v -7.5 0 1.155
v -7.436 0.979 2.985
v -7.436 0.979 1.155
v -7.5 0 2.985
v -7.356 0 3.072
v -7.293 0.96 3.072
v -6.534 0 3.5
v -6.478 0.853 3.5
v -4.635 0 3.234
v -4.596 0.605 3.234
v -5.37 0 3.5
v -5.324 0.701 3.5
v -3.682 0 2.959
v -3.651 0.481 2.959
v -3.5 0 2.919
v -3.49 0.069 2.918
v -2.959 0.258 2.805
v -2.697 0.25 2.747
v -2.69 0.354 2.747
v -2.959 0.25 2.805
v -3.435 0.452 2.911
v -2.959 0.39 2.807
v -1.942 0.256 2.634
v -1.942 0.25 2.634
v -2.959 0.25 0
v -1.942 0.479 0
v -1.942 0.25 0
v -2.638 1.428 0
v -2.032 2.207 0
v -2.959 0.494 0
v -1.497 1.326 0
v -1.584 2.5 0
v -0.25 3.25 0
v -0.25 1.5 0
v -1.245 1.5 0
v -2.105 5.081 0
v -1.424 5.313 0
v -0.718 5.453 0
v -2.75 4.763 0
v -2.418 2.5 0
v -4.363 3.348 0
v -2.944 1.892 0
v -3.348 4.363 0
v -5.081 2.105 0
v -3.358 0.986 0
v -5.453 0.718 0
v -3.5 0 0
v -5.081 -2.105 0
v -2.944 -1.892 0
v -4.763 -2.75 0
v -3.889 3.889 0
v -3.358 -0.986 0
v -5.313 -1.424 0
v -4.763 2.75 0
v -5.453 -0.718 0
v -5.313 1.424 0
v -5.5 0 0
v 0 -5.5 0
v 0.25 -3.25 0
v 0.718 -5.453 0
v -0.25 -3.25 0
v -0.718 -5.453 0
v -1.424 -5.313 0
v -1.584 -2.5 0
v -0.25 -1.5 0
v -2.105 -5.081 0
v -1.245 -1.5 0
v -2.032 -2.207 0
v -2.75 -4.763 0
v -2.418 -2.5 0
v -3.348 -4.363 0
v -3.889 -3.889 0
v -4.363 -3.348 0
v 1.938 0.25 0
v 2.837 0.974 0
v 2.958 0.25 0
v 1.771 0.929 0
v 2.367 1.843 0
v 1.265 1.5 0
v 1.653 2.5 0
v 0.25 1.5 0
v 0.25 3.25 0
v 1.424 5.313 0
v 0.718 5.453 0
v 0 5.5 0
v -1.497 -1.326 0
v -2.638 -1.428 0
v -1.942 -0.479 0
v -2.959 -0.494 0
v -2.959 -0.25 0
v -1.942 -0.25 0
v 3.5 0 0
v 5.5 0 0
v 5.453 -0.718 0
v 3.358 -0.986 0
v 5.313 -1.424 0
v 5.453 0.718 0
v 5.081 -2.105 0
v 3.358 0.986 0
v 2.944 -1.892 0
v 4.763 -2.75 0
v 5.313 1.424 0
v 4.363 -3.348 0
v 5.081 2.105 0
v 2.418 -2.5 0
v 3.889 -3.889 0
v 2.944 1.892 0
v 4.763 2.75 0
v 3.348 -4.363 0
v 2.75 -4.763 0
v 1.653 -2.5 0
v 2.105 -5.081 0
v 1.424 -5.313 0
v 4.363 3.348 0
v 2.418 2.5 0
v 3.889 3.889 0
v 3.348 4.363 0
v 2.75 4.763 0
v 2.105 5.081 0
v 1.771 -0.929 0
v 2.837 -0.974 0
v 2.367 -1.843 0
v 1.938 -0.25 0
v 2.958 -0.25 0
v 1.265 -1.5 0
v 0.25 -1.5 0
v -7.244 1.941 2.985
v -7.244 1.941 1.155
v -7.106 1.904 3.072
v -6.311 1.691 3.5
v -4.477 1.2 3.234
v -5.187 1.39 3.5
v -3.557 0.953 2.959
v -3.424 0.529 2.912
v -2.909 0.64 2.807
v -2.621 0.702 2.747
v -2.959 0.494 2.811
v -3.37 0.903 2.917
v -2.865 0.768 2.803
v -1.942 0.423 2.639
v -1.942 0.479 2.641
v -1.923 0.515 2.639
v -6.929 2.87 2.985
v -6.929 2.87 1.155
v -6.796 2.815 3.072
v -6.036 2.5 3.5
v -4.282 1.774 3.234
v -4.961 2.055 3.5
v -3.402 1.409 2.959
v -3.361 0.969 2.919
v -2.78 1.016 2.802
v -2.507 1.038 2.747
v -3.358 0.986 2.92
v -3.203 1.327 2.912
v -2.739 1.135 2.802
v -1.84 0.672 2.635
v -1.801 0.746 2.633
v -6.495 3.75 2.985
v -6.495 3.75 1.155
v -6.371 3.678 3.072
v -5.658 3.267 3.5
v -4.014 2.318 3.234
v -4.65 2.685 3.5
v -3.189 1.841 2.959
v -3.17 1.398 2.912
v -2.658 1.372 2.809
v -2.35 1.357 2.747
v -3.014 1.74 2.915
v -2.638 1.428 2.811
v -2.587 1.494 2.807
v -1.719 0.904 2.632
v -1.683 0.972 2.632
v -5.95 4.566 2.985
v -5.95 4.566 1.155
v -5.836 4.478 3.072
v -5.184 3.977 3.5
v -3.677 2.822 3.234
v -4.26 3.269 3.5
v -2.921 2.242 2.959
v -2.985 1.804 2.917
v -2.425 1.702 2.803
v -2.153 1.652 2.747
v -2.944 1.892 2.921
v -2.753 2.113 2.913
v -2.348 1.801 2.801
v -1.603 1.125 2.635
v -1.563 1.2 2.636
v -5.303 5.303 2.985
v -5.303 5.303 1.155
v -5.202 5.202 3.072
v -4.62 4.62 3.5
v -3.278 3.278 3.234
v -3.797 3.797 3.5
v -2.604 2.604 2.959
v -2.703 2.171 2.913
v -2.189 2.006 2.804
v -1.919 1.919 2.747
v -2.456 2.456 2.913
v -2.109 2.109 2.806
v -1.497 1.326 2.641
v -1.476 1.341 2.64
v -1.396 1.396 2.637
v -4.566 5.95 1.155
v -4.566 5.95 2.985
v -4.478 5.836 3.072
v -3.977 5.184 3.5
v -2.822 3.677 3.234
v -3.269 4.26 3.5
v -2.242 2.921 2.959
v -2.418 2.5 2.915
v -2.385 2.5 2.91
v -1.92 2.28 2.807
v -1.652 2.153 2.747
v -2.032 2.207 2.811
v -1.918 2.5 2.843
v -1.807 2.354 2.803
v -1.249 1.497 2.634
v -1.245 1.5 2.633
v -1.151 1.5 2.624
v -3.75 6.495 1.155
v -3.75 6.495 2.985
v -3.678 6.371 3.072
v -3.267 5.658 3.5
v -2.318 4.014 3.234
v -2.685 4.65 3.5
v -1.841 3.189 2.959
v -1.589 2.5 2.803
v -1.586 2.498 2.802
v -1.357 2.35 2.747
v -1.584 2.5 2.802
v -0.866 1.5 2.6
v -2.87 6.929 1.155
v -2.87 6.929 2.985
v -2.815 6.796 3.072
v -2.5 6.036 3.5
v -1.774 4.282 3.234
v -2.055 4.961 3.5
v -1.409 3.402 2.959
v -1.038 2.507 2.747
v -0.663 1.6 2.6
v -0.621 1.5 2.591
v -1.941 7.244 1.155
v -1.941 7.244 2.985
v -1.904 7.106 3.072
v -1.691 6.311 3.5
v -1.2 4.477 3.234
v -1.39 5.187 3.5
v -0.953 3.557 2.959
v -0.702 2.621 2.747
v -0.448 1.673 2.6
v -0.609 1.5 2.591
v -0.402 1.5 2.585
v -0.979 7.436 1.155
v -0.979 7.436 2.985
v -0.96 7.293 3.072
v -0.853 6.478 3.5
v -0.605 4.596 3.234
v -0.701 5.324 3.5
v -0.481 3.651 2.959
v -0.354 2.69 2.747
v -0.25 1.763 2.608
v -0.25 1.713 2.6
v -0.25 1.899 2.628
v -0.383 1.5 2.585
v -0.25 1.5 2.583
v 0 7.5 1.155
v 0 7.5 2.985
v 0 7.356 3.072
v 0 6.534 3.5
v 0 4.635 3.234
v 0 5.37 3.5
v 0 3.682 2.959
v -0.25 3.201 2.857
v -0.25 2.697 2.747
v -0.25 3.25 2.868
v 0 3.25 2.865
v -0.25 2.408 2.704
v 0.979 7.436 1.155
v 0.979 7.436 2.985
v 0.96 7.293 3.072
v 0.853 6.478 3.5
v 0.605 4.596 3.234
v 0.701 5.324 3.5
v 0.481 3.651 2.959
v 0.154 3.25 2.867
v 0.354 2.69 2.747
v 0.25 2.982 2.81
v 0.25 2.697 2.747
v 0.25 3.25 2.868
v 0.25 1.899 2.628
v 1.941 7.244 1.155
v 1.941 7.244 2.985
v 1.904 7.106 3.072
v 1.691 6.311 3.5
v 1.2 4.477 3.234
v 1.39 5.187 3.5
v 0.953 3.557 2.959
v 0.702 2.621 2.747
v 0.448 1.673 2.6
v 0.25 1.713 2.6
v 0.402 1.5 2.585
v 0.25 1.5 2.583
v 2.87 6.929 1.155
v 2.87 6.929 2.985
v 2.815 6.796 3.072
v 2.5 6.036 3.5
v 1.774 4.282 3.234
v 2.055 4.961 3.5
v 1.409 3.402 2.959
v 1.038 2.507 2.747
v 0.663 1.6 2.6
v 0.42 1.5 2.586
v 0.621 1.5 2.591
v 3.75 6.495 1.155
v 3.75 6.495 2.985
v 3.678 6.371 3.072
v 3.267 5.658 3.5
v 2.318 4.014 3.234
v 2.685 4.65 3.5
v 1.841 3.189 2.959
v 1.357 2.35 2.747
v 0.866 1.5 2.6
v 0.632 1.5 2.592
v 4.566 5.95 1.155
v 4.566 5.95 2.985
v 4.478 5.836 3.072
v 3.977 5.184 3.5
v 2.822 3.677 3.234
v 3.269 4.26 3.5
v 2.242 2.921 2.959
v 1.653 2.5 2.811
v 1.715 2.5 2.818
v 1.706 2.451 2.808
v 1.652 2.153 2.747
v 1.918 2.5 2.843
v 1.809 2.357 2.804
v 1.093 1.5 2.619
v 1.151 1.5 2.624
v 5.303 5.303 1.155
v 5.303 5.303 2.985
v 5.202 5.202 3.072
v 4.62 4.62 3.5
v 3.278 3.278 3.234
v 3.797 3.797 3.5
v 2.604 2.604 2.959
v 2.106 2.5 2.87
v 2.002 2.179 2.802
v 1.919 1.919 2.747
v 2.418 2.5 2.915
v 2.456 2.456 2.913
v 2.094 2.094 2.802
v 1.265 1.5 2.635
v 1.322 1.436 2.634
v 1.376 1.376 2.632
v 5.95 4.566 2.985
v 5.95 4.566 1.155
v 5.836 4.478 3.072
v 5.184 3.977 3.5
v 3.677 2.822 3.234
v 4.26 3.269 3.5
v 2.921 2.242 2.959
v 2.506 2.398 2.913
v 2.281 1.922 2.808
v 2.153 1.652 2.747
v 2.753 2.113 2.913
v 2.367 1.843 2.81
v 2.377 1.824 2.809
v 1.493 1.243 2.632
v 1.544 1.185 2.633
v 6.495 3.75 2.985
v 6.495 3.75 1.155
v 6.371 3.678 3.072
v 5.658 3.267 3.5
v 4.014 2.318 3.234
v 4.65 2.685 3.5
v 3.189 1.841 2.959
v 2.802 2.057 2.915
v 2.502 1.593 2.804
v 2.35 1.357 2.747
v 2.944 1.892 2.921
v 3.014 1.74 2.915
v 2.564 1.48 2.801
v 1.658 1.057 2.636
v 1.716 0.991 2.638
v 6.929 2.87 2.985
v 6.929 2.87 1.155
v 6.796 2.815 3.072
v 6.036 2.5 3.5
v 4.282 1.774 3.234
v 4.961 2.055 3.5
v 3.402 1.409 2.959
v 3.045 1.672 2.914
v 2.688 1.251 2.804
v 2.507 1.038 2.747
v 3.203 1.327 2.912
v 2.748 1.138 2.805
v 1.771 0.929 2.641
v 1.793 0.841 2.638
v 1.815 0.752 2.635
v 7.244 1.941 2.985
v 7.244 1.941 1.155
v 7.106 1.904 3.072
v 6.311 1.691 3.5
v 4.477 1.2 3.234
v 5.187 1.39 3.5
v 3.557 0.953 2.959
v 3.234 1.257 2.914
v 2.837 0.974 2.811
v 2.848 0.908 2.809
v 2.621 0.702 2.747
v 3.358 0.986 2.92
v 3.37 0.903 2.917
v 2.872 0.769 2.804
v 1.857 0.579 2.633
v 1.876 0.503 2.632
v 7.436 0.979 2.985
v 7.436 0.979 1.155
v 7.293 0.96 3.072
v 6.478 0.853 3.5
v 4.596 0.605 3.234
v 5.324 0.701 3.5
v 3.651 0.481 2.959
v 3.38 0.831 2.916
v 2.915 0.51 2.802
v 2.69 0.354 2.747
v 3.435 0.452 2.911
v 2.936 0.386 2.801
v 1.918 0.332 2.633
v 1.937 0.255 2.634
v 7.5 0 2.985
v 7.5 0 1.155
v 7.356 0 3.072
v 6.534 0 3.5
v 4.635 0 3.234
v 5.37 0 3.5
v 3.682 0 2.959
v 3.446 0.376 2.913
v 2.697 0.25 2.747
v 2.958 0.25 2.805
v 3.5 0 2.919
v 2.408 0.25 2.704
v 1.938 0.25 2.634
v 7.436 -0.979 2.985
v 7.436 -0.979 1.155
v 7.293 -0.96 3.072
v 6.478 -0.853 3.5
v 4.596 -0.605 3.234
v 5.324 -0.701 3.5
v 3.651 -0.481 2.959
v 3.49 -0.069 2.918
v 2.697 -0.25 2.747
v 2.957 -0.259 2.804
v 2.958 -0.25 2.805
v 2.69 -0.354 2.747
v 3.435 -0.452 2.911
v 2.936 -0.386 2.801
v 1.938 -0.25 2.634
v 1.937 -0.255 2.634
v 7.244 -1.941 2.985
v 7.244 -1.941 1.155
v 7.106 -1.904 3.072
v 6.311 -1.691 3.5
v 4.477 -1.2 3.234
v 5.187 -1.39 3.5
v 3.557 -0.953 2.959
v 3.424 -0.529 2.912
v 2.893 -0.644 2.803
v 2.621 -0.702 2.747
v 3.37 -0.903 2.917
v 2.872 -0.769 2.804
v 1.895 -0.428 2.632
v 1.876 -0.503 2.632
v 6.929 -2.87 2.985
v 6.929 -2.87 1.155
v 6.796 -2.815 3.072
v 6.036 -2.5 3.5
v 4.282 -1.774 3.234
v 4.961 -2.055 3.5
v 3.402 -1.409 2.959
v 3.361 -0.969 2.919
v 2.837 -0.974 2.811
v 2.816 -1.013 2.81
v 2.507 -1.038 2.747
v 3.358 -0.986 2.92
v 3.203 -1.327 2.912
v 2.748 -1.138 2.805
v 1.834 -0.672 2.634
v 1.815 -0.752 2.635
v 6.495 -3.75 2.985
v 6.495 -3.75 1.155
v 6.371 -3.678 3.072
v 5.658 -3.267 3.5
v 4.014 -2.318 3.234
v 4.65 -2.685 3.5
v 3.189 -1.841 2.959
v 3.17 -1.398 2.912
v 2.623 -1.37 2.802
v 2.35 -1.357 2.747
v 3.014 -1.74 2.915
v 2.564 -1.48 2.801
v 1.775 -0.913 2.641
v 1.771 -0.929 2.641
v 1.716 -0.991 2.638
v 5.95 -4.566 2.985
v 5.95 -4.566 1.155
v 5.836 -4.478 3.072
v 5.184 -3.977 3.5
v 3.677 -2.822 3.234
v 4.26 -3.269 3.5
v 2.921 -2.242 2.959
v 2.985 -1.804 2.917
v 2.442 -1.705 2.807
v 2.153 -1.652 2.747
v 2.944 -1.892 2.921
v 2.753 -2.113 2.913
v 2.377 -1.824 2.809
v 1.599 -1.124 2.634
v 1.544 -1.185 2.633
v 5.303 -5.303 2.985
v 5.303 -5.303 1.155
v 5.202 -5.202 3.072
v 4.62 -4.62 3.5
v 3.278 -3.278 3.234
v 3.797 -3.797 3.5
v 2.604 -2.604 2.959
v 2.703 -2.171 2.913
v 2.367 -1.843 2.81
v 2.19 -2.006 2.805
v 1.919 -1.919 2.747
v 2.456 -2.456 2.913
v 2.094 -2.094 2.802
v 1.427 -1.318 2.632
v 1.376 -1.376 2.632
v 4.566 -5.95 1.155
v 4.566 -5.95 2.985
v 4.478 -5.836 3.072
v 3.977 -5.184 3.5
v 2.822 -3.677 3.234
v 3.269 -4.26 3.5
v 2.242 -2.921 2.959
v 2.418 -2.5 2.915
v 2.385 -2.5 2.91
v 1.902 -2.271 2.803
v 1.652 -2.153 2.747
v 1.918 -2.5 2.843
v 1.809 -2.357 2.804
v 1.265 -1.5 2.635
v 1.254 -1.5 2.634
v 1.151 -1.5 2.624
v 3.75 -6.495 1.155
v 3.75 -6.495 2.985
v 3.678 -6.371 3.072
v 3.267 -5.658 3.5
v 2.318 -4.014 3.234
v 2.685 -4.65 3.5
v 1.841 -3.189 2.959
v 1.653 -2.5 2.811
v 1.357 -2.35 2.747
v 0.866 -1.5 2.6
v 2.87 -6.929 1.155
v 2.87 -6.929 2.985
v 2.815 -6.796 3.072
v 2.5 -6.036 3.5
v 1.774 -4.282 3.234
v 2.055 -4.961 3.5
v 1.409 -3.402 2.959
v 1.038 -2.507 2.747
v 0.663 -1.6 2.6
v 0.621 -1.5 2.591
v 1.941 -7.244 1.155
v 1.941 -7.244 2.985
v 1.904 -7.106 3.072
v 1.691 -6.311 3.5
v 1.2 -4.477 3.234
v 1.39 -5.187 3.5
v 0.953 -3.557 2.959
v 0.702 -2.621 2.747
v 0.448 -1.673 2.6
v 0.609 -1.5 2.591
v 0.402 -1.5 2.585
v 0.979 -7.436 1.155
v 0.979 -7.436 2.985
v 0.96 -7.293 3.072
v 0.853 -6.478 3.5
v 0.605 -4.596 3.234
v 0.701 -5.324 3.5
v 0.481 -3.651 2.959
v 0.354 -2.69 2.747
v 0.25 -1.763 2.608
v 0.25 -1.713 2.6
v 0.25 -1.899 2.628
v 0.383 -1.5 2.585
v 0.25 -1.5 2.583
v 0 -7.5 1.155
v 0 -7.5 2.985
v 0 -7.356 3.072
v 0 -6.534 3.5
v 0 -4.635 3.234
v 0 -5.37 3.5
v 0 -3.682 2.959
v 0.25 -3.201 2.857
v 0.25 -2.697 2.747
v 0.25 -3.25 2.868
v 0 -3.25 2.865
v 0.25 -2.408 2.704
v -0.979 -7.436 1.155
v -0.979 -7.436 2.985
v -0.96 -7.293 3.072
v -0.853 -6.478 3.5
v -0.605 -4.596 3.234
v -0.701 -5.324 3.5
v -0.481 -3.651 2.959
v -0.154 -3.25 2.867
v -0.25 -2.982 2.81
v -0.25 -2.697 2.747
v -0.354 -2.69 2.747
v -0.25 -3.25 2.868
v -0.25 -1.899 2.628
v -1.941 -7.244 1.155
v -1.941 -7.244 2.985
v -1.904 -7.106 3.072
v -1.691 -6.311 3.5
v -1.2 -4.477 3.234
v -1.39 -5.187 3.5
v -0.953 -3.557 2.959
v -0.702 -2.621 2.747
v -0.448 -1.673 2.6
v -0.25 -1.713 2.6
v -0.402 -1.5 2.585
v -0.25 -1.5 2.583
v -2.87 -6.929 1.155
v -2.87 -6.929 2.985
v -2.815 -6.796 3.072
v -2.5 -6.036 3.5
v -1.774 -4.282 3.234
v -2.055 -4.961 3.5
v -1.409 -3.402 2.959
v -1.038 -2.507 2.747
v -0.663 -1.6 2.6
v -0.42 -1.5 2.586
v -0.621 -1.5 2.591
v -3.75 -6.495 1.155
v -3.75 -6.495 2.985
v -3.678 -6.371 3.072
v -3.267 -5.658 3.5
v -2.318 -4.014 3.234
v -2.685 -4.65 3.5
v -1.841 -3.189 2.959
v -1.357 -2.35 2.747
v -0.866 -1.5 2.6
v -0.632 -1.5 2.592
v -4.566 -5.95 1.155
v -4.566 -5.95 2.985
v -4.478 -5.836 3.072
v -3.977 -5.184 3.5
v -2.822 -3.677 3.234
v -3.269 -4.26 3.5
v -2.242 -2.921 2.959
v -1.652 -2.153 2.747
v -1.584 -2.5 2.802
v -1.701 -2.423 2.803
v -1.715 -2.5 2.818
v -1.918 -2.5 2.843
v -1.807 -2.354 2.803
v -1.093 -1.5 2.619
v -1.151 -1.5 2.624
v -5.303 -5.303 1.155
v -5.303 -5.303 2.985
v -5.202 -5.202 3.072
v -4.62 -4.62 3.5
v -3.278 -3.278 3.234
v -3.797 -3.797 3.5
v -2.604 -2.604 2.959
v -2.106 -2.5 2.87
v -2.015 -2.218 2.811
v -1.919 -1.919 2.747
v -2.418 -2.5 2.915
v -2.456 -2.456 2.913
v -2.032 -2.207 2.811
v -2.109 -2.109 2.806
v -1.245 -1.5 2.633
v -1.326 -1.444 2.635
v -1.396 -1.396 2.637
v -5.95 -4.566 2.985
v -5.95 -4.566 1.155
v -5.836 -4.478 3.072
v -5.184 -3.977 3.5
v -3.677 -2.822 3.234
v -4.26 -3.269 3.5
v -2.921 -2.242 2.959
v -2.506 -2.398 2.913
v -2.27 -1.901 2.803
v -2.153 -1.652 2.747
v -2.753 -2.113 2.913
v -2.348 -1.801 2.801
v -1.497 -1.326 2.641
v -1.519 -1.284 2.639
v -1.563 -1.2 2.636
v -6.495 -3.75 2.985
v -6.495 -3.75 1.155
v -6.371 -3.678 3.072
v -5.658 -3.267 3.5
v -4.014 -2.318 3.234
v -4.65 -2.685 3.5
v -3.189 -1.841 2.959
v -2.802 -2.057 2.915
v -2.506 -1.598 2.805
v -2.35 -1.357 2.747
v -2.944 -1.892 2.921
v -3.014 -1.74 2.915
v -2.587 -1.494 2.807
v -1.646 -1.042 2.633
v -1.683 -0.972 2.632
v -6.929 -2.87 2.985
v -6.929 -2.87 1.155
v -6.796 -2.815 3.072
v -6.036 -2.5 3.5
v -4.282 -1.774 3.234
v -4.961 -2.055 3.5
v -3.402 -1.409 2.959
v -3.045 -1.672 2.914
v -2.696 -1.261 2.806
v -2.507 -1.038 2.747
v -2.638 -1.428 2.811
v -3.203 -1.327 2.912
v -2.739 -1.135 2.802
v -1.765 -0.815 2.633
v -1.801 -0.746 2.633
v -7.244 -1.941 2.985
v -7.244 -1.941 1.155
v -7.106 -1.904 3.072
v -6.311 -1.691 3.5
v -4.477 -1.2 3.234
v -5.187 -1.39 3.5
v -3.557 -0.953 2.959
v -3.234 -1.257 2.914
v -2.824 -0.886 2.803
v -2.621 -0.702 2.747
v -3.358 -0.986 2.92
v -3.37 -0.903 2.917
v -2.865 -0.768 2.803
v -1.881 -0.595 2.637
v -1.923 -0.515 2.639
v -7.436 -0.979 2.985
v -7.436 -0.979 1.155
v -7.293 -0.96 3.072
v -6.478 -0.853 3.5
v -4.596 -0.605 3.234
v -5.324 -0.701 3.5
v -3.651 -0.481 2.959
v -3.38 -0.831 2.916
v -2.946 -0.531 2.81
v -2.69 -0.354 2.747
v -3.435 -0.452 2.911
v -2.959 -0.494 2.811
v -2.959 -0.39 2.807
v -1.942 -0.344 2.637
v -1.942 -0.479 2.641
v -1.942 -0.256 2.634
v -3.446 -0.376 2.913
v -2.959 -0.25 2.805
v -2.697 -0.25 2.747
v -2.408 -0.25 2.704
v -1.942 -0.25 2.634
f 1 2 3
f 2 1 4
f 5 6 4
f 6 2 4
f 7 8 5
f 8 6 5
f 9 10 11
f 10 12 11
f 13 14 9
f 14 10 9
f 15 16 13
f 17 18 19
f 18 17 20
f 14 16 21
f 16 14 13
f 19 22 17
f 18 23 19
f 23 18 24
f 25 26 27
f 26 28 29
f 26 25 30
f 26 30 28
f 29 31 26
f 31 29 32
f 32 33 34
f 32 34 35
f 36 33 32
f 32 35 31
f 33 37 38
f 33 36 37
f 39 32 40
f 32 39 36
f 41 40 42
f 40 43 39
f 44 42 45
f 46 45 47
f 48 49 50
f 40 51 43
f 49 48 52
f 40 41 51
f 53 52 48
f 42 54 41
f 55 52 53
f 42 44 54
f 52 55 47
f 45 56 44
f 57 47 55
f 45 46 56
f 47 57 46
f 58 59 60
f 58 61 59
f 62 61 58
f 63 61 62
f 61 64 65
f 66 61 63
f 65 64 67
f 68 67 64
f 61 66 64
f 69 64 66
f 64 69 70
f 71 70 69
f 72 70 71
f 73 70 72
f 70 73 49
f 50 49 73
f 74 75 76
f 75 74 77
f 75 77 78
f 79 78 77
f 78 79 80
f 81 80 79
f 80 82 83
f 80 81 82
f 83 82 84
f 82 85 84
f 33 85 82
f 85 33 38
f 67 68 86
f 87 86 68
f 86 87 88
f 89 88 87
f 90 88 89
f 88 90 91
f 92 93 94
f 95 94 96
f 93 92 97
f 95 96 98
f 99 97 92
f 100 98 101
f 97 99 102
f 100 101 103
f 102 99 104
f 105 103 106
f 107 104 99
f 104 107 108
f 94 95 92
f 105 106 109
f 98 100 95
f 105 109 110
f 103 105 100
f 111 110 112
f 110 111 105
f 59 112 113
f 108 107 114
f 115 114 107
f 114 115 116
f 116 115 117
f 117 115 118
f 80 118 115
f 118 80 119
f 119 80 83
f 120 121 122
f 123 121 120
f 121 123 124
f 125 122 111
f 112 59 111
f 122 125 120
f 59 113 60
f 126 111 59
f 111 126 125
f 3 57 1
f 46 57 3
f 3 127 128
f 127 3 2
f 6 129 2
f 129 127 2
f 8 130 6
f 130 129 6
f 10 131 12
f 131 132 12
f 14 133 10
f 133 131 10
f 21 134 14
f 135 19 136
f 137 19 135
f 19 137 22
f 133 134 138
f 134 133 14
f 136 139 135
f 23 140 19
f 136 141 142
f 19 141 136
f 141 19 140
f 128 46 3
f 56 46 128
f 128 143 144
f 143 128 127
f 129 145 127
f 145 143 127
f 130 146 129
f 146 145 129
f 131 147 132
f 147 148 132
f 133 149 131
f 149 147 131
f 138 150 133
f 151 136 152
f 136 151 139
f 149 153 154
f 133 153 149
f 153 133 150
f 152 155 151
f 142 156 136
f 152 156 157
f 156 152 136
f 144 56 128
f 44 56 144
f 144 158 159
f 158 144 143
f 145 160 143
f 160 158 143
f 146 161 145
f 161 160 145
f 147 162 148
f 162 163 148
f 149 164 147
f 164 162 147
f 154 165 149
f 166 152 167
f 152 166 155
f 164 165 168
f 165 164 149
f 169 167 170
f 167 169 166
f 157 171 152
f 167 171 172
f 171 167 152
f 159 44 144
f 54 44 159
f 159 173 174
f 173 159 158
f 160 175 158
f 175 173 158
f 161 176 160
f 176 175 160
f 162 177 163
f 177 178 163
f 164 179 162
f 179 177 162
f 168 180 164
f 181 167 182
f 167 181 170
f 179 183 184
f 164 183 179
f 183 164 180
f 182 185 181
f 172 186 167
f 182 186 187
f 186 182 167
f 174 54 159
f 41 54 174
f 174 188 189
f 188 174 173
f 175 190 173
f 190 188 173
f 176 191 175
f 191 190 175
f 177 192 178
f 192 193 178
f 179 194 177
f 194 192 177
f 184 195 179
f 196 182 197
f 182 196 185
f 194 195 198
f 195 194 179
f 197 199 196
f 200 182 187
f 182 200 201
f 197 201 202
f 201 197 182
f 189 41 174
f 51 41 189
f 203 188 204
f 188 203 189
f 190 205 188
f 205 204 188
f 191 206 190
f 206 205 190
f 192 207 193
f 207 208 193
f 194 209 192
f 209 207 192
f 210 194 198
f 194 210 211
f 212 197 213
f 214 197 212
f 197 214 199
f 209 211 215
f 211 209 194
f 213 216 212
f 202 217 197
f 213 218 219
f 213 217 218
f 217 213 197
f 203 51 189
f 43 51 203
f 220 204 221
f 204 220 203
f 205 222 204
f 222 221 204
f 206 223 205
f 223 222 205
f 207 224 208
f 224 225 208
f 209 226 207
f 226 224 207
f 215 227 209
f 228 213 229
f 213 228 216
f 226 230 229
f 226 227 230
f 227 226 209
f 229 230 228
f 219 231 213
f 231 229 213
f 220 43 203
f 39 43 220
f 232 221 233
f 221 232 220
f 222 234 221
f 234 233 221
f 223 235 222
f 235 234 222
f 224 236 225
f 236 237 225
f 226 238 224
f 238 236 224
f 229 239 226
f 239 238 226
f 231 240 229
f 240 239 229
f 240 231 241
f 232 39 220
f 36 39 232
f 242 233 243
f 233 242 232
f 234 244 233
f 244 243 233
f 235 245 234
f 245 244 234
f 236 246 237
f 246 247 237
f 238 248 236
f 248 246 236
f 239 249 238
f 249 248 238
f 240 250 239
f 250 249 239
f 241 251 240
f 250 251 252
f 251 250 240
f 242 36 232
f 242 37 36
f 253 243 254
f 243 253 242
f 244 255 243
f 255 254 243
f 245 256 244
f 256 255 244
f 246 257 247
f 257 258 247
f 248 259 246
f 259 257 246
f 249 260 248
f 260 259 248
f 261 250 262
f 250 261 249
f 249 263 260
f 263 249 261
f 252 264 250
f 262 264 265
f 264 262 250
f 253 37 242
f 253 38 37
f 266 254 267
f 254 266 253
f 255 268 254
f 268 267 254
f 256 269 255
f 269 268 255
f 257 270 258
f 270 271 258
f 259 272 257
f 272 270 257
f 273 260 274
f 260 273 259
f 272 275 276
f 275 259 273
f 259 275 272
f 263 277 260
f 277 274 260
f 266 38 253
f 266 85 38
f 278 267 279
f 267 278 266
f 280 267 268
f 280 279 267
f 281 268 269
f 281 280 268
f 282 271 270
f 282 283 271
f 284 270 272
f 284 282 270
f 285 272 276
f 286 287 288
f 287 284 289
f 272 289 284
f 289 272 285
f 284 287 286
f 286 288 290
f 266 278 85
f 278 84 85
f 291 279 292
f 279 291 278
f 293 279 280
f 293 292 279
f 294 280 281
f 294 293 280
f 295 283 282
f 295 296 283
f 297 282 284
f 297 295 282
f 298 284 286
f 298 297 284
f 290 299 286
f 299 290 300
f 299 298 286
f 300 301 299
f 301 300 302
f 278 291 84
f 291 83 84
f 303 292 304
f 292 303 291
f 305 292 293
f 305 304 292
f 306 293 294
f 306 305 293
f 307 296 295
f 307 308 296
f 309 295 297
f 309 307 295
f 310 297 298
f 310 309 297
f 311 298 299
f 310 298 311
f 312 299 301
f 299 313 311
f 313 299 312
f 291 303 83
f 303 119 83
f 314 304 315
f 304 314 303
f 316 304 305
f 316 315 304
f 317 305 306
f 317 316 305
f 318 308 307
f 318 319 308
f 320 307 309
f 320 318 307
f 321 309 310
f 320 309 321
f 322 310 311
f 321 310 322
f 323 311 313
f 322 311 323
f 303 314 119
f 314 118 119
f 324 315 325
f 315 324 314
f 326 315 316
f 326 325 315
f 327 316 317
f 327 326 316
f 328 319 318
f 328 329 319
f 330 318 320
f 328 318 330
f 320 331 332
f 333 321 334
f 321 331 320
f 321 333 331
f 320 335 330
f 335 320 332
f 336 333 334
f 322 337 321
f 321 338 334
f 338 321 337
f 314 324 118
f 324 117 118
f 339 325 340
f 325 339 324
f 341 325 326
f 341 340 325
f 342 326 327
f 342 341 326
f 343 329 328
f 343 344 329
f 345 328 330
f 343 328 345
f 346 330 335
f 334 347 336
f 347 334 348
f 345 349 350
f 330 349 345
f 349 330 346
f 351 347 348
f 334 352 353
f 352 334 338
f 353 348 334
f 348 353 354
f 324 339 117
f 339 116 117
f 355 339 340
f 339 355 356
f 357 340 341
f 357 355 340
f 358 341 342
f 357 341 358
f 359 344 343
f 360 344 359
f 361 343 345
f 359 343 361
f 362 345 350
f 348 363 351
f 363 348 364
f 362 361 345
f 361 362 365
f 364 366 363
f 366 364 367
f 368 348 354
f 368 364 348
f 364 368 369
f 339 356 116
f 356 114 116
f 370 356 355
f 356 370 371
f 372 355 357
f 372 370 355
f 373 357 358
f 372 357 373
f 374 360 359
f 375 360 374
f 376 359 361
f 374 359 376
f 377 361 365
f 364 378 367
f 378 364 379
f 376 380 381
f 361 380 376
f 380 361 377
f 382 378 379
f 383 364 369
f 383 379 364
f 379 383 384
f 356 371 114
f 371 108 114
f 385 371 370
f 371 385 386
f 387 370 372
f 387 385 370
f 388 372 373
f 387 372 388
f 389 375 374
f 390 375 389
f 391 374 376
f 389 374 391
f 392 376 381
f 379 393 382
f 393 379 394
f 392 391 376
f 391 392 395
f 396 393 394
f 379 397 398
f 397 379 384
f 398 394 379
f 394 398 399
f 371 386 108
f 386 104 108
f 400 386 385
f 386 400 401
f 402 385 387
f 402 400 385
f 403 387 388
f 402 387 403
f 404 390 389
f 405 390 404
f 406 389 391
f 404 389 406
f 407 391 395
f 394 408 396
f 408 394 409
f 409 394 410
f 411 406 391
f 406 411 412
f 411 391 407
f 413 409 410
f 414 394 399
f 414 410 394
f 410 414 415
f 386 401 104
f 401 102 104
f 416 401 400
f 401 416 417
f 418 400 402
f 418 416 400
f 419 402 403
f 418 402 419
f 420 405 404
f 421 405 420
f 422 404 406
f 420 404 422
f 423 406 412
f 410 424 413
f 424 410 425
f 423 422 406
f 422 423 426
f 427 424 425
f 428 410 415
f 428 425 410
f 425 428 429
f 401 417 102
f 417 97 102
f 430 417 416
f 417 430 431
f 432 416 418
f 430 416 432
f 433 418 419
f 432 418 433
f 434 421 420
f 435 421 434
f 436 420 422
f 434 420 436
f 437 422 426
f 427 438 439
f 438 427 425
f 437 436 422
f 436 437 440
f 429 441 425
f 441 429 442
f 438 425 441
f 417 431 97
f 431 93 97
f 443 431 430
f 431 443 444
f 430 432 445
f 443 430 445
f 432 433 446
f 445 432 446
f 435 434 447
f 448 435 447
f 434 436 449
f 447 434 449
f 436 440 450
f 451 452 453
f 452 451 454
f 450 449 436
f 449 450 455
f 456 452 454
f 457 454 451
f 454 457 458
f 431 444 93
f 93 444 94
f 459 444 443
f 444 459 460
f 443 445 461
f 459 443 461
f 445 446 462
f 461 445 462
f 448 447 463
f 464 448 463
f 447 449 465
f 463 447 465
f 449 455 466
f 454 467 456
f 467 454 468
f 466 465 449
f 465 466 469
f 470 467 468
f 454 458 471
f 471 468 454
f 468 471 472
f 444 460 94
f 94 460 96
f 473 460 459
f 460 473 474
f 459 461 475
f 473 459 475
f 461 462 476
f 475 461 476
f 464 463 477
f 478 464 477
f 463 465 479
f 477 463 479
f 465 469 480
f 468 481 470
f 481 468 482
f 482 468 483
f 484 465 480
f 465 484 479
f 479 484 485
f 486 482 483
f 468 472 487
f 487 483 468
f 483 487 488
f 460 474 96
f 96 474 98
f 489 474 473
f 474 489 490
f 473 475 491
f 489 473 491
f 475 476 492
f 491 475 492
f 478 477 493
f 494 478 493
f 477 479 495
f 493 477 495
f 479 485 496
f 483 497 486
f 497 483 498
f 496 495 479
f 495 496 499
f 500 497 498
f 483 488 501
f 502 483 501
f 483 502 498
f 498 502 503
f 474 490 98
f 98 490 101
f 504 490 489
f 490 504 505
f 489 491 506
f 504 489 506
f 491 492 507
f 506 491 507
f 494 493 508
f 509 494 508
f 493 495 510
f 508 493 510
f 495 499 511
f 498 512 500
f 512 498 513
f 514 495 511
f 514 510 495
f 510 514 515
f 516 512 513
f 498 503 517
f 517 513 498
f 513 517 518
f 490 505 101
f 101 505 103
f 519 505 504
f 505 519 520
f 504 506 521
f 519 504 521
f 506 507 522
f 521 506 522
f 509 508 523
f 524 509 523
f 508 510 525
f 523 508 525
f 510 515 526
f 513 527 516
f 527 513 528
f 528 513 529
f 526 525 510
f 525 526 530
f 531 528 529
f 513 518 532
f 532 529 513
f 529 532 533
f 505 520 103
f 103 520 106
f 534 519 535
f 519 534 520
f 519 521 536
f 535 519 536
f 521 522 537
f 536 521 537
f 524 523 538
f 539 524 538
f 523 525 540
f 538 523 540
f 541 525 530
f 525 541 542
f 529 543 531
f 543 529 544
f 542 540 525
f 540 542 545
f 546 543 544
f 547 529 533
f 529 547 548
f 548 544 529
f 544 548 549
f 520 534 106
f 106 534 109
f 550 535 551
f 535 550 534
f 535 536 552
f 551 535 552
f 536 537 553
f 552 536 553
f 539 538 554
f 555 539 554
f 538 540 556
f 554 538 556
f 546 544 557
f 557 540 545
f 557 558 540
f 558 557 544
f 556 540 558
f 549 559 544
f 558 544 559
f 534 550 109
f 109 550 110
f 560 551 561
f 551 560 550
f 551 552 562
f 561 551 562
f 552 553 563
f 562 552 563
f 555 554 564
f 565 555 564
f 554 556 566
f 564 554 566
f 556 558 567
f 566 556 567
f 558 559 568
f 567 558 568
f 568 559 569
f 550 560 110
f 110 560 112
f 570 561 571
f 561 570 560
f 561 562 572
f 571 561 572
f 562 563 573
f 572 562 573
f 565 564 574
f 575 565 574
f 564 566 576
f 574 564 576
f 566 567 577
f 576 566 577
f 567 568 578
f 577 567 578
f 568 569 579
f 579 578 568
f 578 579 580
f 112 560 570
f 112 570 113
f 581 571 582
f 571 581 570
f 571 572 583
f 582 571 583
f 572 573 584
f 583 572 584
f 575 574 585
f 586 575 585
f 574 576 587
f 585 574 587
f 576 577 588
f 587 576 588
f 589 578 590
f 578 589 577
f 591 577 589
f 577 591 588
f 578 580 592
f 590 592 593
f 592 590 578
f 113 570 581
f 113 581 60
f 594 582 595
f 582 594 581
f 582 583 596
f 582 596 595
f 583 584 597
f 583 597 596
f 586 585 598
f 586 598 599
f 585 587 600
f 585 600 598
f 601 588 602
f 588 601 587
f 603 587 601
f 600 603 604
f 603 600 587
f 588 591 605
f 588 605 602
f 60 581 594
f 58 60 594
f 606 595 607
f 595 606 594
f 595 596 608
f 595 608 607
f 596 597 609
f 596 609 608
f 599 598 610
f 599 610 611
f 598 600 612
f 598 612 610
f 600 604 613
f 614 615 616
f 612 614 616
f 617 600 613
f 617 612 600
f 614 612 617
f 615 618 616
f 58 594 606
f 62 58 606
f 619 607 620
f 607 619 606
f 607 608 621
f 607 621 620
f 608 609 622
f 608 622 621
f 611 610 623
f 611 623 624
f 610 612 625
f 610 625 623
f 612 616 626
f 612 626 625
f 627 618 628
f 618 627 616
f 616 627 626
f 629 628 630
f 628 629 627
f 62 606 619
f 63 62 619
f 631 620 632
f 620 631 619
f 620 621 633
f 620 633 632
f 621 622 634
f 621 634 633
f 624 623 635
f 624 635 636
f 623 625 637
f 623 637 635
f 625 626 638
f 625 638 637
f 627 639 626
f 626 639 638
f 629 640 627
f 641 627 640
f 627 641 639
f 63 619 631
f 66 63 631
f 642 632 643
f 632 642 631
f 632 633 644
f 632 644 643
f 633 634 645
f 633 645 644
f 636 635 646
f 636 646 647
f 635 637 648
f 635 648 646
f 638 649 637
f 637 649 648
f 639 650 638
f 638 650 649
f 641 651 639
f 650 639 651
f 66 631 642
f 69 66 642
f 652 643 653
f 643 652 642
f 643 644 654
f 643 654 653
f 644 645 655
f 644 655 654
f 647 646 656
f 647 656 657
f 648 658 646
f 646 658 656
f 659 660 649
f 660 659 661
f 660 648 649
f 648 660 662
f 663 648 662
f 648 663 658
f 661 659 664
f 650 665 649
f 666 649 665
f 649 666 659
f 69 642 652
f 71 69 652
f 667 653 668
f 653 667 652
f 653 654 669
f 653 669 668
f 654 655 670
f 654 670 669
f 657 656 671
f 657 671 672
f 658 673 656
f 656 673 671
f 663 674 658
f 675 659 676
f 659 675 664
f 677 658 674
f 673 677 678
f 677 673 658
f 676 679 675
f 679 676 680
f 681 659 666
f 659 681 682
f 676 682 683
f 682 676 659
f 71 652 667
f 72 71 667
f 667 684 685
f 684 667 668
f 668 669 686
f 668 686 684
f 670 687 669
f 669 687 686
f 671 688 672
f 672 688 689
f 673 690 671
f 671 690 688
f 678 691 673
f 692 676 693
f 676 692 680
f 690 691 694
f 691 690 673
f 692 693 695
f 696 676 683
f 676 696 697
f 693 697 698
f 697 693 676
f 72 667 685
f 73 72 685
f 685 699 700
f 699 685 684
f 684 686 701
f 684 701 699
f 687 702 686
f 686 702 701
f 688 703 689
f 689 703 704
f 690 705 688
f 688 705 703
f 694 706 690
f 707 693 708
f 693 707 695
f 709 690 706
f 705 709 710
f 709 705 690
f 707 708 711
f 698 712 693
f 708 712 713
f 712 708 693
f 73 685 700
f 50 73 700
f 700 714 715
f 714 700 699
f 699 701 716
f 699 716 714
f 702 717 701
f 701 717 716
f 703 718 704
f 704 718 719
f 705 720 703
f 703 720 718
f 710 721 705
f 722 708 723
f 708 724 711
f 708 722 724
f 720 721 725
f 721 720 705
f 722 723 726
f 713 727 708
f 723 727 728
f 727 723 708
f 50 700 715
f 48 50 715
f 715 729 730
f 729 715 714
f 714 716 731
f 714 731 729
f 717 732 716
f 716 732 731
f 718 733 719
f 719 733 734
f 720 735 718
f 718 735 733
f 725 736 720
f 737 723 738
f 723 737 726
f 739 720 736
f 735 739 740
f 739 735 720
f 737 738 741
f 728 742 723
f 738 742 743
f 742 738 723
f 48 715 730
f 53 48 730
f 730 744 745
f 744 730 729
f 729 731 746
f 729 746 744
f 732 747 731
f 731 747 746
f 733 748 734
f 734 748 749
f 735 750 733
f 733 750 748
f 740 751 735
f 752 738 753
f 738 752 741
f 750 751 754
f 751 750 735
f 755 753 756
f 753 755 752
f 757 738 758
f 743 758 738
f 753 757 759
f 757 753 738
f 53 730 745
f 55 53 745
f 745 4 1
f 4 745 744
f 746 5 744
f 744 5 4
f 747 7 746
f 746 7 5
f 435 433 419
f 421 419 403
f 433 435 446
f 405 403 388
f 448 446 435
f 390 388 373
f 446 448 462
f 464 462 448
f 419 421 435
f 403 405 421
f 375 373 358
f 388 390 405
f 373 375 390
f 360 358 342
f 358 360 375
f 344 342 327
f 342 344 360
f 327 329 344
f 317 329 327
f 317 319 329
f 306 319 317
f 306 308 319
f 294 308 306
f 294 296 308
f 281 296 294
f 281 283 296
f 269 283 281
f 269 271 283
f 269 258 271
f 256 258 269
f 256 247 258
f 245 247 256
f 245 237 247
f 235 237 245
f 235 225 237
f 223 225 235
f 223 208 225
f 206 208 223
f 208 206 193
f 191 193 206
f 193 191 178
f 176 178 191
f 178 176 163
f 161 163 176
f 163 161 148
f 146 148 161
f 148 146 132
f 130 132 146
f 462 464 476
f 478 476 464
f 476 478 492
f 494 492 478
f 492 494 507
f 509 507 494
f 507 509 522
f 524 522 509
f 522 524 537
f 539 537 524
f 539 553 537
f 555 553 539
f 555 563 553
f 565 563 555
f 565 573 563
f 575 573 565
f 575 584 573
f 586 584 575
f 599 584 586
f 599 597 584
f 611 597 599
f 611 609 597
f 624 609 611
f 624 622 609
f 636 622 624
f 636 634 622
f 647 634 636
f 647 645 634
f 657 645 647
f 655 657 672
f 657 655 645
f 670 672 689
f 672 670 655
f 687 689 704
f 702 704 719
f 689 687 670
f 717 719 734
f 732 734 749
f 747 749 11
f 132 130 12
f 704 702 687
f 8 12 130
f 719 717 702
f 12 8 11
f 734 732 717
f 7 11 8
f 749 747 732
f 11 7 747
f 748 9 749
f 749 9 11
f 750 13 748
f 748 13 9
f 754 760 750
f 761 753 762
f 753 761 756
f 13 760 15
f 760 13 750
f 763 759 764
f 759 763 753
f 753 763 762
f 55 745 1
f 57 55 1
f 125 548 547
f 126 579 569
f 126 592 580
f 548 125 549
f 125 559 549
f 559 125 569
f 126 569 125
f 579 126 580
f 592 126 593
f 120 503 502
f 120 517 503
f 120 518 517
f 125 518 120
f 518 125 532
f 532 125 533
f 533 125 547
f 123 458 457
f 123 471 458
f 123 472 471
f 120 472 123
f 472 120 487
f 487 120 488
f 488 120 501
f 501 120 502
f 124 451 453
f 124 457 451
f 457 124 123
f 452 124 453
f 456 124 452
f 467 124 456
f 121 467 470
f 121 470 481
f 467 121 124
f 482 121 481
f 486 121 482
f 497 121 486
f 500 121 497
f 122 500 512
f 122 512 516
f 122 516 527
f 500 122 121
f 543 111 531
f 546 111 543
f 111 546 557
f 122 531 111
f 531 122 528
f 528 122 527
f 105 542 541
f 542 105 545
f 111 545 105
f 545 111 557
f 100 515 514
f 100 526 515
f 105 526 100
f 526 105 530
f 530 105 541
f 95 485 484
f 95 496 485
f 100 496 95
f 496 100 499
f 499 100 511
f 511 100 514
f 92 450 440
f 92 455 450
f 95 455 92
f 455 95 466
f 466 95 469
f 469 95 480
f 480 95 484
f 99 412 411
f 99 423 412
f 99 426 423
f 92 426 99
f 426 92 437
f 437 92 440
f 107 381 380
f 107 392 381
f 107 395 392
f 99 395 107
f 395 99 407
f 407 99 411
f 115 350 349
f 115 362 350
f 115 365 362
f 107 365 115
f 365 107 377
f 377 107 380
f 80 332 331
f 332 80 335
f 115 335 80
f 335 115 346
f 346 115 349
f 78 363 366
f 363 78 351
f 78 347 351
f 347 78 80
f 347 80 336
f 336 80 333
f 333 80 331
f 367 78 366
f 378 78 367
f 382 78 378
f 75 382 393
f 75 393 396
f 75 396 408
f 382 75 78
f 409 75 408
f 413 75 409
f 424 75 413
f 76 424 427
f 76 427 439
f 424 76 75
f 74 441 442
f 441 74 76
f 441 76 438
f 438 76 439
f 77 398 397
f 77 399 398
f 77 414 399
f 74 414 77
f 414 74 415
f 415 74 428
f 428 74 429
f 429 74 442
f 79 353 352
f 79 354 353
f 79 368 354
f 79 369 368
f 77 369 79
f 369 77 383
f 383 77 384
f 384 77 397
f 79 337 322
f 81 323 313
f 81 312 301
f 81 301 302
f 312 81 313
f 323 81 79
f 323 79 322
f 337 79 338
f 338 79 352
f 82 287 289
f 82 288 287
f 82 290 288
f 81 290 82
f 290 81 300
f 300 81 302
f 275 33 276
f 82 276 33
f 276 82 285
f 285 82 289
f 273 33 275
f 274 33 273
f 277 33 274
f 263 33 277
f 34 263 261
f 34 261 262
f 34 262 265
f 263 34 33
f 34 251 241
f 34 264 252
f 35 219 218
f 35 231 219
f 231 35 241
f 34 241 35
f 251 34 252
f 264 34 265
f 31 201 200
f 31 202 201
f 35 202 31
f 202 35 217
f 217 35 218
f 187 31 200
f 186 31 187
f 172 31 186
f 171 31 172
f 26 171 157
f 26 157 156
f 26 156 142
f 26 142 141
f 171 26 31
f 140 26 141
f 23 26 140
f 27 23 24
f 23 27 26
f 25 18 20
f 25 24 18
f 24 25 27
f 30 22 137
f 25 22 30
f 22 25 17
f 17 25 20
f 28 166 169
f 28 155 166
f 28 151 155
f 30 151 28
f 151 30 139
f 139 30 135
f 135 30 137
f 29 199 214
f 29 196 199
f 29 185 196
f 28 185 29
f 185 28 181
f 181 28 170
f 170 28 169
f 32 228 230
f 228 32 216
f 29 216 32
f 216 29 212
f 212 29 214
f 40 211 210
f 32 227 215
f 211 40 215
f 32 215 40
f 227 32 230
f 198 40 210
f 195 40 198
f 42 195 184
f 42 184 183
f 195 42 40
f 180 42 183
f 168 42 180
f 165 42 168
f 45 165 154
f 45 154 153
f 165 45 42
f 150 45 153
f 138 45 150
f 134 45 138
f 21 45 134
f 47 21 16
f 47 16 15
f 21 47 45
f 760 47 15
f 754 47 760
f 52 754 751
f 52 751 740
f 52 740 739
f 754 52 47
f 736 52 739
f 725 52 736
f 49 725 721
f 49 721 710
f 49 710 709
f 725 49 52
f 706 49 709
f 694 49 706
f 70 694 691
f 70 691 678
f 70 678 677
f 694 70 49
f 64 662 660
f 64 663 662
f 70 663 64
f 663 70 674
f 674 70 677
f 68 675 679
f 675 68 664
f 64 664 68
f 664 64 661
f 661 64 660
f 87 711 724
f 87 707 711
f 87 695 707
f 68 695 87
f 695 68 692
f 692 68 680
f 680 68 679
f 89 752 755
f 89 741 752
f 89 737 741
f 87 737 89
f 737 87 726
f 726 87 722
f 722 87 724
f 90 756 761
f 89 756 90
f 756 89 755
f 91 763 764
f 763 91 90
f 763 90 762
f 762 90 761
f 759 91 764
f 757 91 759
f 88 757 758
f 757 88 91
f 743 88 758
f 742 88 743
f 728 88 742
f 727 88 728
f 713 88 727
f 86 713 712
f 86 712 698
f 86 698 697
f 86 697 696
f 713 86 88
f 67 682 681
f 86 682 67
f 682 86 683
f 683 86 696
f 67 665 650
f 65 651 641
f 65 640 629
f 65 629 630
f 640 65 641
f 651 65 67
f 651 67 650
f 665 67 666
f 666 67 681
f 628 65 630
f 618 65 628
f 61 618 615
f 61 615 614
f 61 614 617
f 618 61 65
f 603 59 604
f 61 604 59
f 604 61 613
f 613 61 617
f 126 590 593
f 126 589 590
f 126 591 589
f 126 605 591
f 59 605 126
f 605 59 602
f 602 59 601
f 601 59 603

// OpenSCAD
$fa=1;$fs=1;
module danmen(){
	intersection(){
		difference(){
			square([15/2,3.5]);
			translate([0,15+2.5])circle(15);
			translate([15/2-2,0])rotate(30)translate([0,-5])square([5,5]);
		}
		translate([0,-10])circle(15);
	}
}

difference(){
	rotate_extrude(){
		danmen();
	}


	linear_extrude(5){
		union(){
			intersection(){
				circle(d=4);
				square([4,3],center=true);
			}
			
			intersection(){
				difference(){
					circle(d=7);
					circle(d=6);
				}
				square([7,5],center=true);
			}
			
			square([6.5,.5],center=true);
			square([.5,6.5],center=true);
		}
	}
}
